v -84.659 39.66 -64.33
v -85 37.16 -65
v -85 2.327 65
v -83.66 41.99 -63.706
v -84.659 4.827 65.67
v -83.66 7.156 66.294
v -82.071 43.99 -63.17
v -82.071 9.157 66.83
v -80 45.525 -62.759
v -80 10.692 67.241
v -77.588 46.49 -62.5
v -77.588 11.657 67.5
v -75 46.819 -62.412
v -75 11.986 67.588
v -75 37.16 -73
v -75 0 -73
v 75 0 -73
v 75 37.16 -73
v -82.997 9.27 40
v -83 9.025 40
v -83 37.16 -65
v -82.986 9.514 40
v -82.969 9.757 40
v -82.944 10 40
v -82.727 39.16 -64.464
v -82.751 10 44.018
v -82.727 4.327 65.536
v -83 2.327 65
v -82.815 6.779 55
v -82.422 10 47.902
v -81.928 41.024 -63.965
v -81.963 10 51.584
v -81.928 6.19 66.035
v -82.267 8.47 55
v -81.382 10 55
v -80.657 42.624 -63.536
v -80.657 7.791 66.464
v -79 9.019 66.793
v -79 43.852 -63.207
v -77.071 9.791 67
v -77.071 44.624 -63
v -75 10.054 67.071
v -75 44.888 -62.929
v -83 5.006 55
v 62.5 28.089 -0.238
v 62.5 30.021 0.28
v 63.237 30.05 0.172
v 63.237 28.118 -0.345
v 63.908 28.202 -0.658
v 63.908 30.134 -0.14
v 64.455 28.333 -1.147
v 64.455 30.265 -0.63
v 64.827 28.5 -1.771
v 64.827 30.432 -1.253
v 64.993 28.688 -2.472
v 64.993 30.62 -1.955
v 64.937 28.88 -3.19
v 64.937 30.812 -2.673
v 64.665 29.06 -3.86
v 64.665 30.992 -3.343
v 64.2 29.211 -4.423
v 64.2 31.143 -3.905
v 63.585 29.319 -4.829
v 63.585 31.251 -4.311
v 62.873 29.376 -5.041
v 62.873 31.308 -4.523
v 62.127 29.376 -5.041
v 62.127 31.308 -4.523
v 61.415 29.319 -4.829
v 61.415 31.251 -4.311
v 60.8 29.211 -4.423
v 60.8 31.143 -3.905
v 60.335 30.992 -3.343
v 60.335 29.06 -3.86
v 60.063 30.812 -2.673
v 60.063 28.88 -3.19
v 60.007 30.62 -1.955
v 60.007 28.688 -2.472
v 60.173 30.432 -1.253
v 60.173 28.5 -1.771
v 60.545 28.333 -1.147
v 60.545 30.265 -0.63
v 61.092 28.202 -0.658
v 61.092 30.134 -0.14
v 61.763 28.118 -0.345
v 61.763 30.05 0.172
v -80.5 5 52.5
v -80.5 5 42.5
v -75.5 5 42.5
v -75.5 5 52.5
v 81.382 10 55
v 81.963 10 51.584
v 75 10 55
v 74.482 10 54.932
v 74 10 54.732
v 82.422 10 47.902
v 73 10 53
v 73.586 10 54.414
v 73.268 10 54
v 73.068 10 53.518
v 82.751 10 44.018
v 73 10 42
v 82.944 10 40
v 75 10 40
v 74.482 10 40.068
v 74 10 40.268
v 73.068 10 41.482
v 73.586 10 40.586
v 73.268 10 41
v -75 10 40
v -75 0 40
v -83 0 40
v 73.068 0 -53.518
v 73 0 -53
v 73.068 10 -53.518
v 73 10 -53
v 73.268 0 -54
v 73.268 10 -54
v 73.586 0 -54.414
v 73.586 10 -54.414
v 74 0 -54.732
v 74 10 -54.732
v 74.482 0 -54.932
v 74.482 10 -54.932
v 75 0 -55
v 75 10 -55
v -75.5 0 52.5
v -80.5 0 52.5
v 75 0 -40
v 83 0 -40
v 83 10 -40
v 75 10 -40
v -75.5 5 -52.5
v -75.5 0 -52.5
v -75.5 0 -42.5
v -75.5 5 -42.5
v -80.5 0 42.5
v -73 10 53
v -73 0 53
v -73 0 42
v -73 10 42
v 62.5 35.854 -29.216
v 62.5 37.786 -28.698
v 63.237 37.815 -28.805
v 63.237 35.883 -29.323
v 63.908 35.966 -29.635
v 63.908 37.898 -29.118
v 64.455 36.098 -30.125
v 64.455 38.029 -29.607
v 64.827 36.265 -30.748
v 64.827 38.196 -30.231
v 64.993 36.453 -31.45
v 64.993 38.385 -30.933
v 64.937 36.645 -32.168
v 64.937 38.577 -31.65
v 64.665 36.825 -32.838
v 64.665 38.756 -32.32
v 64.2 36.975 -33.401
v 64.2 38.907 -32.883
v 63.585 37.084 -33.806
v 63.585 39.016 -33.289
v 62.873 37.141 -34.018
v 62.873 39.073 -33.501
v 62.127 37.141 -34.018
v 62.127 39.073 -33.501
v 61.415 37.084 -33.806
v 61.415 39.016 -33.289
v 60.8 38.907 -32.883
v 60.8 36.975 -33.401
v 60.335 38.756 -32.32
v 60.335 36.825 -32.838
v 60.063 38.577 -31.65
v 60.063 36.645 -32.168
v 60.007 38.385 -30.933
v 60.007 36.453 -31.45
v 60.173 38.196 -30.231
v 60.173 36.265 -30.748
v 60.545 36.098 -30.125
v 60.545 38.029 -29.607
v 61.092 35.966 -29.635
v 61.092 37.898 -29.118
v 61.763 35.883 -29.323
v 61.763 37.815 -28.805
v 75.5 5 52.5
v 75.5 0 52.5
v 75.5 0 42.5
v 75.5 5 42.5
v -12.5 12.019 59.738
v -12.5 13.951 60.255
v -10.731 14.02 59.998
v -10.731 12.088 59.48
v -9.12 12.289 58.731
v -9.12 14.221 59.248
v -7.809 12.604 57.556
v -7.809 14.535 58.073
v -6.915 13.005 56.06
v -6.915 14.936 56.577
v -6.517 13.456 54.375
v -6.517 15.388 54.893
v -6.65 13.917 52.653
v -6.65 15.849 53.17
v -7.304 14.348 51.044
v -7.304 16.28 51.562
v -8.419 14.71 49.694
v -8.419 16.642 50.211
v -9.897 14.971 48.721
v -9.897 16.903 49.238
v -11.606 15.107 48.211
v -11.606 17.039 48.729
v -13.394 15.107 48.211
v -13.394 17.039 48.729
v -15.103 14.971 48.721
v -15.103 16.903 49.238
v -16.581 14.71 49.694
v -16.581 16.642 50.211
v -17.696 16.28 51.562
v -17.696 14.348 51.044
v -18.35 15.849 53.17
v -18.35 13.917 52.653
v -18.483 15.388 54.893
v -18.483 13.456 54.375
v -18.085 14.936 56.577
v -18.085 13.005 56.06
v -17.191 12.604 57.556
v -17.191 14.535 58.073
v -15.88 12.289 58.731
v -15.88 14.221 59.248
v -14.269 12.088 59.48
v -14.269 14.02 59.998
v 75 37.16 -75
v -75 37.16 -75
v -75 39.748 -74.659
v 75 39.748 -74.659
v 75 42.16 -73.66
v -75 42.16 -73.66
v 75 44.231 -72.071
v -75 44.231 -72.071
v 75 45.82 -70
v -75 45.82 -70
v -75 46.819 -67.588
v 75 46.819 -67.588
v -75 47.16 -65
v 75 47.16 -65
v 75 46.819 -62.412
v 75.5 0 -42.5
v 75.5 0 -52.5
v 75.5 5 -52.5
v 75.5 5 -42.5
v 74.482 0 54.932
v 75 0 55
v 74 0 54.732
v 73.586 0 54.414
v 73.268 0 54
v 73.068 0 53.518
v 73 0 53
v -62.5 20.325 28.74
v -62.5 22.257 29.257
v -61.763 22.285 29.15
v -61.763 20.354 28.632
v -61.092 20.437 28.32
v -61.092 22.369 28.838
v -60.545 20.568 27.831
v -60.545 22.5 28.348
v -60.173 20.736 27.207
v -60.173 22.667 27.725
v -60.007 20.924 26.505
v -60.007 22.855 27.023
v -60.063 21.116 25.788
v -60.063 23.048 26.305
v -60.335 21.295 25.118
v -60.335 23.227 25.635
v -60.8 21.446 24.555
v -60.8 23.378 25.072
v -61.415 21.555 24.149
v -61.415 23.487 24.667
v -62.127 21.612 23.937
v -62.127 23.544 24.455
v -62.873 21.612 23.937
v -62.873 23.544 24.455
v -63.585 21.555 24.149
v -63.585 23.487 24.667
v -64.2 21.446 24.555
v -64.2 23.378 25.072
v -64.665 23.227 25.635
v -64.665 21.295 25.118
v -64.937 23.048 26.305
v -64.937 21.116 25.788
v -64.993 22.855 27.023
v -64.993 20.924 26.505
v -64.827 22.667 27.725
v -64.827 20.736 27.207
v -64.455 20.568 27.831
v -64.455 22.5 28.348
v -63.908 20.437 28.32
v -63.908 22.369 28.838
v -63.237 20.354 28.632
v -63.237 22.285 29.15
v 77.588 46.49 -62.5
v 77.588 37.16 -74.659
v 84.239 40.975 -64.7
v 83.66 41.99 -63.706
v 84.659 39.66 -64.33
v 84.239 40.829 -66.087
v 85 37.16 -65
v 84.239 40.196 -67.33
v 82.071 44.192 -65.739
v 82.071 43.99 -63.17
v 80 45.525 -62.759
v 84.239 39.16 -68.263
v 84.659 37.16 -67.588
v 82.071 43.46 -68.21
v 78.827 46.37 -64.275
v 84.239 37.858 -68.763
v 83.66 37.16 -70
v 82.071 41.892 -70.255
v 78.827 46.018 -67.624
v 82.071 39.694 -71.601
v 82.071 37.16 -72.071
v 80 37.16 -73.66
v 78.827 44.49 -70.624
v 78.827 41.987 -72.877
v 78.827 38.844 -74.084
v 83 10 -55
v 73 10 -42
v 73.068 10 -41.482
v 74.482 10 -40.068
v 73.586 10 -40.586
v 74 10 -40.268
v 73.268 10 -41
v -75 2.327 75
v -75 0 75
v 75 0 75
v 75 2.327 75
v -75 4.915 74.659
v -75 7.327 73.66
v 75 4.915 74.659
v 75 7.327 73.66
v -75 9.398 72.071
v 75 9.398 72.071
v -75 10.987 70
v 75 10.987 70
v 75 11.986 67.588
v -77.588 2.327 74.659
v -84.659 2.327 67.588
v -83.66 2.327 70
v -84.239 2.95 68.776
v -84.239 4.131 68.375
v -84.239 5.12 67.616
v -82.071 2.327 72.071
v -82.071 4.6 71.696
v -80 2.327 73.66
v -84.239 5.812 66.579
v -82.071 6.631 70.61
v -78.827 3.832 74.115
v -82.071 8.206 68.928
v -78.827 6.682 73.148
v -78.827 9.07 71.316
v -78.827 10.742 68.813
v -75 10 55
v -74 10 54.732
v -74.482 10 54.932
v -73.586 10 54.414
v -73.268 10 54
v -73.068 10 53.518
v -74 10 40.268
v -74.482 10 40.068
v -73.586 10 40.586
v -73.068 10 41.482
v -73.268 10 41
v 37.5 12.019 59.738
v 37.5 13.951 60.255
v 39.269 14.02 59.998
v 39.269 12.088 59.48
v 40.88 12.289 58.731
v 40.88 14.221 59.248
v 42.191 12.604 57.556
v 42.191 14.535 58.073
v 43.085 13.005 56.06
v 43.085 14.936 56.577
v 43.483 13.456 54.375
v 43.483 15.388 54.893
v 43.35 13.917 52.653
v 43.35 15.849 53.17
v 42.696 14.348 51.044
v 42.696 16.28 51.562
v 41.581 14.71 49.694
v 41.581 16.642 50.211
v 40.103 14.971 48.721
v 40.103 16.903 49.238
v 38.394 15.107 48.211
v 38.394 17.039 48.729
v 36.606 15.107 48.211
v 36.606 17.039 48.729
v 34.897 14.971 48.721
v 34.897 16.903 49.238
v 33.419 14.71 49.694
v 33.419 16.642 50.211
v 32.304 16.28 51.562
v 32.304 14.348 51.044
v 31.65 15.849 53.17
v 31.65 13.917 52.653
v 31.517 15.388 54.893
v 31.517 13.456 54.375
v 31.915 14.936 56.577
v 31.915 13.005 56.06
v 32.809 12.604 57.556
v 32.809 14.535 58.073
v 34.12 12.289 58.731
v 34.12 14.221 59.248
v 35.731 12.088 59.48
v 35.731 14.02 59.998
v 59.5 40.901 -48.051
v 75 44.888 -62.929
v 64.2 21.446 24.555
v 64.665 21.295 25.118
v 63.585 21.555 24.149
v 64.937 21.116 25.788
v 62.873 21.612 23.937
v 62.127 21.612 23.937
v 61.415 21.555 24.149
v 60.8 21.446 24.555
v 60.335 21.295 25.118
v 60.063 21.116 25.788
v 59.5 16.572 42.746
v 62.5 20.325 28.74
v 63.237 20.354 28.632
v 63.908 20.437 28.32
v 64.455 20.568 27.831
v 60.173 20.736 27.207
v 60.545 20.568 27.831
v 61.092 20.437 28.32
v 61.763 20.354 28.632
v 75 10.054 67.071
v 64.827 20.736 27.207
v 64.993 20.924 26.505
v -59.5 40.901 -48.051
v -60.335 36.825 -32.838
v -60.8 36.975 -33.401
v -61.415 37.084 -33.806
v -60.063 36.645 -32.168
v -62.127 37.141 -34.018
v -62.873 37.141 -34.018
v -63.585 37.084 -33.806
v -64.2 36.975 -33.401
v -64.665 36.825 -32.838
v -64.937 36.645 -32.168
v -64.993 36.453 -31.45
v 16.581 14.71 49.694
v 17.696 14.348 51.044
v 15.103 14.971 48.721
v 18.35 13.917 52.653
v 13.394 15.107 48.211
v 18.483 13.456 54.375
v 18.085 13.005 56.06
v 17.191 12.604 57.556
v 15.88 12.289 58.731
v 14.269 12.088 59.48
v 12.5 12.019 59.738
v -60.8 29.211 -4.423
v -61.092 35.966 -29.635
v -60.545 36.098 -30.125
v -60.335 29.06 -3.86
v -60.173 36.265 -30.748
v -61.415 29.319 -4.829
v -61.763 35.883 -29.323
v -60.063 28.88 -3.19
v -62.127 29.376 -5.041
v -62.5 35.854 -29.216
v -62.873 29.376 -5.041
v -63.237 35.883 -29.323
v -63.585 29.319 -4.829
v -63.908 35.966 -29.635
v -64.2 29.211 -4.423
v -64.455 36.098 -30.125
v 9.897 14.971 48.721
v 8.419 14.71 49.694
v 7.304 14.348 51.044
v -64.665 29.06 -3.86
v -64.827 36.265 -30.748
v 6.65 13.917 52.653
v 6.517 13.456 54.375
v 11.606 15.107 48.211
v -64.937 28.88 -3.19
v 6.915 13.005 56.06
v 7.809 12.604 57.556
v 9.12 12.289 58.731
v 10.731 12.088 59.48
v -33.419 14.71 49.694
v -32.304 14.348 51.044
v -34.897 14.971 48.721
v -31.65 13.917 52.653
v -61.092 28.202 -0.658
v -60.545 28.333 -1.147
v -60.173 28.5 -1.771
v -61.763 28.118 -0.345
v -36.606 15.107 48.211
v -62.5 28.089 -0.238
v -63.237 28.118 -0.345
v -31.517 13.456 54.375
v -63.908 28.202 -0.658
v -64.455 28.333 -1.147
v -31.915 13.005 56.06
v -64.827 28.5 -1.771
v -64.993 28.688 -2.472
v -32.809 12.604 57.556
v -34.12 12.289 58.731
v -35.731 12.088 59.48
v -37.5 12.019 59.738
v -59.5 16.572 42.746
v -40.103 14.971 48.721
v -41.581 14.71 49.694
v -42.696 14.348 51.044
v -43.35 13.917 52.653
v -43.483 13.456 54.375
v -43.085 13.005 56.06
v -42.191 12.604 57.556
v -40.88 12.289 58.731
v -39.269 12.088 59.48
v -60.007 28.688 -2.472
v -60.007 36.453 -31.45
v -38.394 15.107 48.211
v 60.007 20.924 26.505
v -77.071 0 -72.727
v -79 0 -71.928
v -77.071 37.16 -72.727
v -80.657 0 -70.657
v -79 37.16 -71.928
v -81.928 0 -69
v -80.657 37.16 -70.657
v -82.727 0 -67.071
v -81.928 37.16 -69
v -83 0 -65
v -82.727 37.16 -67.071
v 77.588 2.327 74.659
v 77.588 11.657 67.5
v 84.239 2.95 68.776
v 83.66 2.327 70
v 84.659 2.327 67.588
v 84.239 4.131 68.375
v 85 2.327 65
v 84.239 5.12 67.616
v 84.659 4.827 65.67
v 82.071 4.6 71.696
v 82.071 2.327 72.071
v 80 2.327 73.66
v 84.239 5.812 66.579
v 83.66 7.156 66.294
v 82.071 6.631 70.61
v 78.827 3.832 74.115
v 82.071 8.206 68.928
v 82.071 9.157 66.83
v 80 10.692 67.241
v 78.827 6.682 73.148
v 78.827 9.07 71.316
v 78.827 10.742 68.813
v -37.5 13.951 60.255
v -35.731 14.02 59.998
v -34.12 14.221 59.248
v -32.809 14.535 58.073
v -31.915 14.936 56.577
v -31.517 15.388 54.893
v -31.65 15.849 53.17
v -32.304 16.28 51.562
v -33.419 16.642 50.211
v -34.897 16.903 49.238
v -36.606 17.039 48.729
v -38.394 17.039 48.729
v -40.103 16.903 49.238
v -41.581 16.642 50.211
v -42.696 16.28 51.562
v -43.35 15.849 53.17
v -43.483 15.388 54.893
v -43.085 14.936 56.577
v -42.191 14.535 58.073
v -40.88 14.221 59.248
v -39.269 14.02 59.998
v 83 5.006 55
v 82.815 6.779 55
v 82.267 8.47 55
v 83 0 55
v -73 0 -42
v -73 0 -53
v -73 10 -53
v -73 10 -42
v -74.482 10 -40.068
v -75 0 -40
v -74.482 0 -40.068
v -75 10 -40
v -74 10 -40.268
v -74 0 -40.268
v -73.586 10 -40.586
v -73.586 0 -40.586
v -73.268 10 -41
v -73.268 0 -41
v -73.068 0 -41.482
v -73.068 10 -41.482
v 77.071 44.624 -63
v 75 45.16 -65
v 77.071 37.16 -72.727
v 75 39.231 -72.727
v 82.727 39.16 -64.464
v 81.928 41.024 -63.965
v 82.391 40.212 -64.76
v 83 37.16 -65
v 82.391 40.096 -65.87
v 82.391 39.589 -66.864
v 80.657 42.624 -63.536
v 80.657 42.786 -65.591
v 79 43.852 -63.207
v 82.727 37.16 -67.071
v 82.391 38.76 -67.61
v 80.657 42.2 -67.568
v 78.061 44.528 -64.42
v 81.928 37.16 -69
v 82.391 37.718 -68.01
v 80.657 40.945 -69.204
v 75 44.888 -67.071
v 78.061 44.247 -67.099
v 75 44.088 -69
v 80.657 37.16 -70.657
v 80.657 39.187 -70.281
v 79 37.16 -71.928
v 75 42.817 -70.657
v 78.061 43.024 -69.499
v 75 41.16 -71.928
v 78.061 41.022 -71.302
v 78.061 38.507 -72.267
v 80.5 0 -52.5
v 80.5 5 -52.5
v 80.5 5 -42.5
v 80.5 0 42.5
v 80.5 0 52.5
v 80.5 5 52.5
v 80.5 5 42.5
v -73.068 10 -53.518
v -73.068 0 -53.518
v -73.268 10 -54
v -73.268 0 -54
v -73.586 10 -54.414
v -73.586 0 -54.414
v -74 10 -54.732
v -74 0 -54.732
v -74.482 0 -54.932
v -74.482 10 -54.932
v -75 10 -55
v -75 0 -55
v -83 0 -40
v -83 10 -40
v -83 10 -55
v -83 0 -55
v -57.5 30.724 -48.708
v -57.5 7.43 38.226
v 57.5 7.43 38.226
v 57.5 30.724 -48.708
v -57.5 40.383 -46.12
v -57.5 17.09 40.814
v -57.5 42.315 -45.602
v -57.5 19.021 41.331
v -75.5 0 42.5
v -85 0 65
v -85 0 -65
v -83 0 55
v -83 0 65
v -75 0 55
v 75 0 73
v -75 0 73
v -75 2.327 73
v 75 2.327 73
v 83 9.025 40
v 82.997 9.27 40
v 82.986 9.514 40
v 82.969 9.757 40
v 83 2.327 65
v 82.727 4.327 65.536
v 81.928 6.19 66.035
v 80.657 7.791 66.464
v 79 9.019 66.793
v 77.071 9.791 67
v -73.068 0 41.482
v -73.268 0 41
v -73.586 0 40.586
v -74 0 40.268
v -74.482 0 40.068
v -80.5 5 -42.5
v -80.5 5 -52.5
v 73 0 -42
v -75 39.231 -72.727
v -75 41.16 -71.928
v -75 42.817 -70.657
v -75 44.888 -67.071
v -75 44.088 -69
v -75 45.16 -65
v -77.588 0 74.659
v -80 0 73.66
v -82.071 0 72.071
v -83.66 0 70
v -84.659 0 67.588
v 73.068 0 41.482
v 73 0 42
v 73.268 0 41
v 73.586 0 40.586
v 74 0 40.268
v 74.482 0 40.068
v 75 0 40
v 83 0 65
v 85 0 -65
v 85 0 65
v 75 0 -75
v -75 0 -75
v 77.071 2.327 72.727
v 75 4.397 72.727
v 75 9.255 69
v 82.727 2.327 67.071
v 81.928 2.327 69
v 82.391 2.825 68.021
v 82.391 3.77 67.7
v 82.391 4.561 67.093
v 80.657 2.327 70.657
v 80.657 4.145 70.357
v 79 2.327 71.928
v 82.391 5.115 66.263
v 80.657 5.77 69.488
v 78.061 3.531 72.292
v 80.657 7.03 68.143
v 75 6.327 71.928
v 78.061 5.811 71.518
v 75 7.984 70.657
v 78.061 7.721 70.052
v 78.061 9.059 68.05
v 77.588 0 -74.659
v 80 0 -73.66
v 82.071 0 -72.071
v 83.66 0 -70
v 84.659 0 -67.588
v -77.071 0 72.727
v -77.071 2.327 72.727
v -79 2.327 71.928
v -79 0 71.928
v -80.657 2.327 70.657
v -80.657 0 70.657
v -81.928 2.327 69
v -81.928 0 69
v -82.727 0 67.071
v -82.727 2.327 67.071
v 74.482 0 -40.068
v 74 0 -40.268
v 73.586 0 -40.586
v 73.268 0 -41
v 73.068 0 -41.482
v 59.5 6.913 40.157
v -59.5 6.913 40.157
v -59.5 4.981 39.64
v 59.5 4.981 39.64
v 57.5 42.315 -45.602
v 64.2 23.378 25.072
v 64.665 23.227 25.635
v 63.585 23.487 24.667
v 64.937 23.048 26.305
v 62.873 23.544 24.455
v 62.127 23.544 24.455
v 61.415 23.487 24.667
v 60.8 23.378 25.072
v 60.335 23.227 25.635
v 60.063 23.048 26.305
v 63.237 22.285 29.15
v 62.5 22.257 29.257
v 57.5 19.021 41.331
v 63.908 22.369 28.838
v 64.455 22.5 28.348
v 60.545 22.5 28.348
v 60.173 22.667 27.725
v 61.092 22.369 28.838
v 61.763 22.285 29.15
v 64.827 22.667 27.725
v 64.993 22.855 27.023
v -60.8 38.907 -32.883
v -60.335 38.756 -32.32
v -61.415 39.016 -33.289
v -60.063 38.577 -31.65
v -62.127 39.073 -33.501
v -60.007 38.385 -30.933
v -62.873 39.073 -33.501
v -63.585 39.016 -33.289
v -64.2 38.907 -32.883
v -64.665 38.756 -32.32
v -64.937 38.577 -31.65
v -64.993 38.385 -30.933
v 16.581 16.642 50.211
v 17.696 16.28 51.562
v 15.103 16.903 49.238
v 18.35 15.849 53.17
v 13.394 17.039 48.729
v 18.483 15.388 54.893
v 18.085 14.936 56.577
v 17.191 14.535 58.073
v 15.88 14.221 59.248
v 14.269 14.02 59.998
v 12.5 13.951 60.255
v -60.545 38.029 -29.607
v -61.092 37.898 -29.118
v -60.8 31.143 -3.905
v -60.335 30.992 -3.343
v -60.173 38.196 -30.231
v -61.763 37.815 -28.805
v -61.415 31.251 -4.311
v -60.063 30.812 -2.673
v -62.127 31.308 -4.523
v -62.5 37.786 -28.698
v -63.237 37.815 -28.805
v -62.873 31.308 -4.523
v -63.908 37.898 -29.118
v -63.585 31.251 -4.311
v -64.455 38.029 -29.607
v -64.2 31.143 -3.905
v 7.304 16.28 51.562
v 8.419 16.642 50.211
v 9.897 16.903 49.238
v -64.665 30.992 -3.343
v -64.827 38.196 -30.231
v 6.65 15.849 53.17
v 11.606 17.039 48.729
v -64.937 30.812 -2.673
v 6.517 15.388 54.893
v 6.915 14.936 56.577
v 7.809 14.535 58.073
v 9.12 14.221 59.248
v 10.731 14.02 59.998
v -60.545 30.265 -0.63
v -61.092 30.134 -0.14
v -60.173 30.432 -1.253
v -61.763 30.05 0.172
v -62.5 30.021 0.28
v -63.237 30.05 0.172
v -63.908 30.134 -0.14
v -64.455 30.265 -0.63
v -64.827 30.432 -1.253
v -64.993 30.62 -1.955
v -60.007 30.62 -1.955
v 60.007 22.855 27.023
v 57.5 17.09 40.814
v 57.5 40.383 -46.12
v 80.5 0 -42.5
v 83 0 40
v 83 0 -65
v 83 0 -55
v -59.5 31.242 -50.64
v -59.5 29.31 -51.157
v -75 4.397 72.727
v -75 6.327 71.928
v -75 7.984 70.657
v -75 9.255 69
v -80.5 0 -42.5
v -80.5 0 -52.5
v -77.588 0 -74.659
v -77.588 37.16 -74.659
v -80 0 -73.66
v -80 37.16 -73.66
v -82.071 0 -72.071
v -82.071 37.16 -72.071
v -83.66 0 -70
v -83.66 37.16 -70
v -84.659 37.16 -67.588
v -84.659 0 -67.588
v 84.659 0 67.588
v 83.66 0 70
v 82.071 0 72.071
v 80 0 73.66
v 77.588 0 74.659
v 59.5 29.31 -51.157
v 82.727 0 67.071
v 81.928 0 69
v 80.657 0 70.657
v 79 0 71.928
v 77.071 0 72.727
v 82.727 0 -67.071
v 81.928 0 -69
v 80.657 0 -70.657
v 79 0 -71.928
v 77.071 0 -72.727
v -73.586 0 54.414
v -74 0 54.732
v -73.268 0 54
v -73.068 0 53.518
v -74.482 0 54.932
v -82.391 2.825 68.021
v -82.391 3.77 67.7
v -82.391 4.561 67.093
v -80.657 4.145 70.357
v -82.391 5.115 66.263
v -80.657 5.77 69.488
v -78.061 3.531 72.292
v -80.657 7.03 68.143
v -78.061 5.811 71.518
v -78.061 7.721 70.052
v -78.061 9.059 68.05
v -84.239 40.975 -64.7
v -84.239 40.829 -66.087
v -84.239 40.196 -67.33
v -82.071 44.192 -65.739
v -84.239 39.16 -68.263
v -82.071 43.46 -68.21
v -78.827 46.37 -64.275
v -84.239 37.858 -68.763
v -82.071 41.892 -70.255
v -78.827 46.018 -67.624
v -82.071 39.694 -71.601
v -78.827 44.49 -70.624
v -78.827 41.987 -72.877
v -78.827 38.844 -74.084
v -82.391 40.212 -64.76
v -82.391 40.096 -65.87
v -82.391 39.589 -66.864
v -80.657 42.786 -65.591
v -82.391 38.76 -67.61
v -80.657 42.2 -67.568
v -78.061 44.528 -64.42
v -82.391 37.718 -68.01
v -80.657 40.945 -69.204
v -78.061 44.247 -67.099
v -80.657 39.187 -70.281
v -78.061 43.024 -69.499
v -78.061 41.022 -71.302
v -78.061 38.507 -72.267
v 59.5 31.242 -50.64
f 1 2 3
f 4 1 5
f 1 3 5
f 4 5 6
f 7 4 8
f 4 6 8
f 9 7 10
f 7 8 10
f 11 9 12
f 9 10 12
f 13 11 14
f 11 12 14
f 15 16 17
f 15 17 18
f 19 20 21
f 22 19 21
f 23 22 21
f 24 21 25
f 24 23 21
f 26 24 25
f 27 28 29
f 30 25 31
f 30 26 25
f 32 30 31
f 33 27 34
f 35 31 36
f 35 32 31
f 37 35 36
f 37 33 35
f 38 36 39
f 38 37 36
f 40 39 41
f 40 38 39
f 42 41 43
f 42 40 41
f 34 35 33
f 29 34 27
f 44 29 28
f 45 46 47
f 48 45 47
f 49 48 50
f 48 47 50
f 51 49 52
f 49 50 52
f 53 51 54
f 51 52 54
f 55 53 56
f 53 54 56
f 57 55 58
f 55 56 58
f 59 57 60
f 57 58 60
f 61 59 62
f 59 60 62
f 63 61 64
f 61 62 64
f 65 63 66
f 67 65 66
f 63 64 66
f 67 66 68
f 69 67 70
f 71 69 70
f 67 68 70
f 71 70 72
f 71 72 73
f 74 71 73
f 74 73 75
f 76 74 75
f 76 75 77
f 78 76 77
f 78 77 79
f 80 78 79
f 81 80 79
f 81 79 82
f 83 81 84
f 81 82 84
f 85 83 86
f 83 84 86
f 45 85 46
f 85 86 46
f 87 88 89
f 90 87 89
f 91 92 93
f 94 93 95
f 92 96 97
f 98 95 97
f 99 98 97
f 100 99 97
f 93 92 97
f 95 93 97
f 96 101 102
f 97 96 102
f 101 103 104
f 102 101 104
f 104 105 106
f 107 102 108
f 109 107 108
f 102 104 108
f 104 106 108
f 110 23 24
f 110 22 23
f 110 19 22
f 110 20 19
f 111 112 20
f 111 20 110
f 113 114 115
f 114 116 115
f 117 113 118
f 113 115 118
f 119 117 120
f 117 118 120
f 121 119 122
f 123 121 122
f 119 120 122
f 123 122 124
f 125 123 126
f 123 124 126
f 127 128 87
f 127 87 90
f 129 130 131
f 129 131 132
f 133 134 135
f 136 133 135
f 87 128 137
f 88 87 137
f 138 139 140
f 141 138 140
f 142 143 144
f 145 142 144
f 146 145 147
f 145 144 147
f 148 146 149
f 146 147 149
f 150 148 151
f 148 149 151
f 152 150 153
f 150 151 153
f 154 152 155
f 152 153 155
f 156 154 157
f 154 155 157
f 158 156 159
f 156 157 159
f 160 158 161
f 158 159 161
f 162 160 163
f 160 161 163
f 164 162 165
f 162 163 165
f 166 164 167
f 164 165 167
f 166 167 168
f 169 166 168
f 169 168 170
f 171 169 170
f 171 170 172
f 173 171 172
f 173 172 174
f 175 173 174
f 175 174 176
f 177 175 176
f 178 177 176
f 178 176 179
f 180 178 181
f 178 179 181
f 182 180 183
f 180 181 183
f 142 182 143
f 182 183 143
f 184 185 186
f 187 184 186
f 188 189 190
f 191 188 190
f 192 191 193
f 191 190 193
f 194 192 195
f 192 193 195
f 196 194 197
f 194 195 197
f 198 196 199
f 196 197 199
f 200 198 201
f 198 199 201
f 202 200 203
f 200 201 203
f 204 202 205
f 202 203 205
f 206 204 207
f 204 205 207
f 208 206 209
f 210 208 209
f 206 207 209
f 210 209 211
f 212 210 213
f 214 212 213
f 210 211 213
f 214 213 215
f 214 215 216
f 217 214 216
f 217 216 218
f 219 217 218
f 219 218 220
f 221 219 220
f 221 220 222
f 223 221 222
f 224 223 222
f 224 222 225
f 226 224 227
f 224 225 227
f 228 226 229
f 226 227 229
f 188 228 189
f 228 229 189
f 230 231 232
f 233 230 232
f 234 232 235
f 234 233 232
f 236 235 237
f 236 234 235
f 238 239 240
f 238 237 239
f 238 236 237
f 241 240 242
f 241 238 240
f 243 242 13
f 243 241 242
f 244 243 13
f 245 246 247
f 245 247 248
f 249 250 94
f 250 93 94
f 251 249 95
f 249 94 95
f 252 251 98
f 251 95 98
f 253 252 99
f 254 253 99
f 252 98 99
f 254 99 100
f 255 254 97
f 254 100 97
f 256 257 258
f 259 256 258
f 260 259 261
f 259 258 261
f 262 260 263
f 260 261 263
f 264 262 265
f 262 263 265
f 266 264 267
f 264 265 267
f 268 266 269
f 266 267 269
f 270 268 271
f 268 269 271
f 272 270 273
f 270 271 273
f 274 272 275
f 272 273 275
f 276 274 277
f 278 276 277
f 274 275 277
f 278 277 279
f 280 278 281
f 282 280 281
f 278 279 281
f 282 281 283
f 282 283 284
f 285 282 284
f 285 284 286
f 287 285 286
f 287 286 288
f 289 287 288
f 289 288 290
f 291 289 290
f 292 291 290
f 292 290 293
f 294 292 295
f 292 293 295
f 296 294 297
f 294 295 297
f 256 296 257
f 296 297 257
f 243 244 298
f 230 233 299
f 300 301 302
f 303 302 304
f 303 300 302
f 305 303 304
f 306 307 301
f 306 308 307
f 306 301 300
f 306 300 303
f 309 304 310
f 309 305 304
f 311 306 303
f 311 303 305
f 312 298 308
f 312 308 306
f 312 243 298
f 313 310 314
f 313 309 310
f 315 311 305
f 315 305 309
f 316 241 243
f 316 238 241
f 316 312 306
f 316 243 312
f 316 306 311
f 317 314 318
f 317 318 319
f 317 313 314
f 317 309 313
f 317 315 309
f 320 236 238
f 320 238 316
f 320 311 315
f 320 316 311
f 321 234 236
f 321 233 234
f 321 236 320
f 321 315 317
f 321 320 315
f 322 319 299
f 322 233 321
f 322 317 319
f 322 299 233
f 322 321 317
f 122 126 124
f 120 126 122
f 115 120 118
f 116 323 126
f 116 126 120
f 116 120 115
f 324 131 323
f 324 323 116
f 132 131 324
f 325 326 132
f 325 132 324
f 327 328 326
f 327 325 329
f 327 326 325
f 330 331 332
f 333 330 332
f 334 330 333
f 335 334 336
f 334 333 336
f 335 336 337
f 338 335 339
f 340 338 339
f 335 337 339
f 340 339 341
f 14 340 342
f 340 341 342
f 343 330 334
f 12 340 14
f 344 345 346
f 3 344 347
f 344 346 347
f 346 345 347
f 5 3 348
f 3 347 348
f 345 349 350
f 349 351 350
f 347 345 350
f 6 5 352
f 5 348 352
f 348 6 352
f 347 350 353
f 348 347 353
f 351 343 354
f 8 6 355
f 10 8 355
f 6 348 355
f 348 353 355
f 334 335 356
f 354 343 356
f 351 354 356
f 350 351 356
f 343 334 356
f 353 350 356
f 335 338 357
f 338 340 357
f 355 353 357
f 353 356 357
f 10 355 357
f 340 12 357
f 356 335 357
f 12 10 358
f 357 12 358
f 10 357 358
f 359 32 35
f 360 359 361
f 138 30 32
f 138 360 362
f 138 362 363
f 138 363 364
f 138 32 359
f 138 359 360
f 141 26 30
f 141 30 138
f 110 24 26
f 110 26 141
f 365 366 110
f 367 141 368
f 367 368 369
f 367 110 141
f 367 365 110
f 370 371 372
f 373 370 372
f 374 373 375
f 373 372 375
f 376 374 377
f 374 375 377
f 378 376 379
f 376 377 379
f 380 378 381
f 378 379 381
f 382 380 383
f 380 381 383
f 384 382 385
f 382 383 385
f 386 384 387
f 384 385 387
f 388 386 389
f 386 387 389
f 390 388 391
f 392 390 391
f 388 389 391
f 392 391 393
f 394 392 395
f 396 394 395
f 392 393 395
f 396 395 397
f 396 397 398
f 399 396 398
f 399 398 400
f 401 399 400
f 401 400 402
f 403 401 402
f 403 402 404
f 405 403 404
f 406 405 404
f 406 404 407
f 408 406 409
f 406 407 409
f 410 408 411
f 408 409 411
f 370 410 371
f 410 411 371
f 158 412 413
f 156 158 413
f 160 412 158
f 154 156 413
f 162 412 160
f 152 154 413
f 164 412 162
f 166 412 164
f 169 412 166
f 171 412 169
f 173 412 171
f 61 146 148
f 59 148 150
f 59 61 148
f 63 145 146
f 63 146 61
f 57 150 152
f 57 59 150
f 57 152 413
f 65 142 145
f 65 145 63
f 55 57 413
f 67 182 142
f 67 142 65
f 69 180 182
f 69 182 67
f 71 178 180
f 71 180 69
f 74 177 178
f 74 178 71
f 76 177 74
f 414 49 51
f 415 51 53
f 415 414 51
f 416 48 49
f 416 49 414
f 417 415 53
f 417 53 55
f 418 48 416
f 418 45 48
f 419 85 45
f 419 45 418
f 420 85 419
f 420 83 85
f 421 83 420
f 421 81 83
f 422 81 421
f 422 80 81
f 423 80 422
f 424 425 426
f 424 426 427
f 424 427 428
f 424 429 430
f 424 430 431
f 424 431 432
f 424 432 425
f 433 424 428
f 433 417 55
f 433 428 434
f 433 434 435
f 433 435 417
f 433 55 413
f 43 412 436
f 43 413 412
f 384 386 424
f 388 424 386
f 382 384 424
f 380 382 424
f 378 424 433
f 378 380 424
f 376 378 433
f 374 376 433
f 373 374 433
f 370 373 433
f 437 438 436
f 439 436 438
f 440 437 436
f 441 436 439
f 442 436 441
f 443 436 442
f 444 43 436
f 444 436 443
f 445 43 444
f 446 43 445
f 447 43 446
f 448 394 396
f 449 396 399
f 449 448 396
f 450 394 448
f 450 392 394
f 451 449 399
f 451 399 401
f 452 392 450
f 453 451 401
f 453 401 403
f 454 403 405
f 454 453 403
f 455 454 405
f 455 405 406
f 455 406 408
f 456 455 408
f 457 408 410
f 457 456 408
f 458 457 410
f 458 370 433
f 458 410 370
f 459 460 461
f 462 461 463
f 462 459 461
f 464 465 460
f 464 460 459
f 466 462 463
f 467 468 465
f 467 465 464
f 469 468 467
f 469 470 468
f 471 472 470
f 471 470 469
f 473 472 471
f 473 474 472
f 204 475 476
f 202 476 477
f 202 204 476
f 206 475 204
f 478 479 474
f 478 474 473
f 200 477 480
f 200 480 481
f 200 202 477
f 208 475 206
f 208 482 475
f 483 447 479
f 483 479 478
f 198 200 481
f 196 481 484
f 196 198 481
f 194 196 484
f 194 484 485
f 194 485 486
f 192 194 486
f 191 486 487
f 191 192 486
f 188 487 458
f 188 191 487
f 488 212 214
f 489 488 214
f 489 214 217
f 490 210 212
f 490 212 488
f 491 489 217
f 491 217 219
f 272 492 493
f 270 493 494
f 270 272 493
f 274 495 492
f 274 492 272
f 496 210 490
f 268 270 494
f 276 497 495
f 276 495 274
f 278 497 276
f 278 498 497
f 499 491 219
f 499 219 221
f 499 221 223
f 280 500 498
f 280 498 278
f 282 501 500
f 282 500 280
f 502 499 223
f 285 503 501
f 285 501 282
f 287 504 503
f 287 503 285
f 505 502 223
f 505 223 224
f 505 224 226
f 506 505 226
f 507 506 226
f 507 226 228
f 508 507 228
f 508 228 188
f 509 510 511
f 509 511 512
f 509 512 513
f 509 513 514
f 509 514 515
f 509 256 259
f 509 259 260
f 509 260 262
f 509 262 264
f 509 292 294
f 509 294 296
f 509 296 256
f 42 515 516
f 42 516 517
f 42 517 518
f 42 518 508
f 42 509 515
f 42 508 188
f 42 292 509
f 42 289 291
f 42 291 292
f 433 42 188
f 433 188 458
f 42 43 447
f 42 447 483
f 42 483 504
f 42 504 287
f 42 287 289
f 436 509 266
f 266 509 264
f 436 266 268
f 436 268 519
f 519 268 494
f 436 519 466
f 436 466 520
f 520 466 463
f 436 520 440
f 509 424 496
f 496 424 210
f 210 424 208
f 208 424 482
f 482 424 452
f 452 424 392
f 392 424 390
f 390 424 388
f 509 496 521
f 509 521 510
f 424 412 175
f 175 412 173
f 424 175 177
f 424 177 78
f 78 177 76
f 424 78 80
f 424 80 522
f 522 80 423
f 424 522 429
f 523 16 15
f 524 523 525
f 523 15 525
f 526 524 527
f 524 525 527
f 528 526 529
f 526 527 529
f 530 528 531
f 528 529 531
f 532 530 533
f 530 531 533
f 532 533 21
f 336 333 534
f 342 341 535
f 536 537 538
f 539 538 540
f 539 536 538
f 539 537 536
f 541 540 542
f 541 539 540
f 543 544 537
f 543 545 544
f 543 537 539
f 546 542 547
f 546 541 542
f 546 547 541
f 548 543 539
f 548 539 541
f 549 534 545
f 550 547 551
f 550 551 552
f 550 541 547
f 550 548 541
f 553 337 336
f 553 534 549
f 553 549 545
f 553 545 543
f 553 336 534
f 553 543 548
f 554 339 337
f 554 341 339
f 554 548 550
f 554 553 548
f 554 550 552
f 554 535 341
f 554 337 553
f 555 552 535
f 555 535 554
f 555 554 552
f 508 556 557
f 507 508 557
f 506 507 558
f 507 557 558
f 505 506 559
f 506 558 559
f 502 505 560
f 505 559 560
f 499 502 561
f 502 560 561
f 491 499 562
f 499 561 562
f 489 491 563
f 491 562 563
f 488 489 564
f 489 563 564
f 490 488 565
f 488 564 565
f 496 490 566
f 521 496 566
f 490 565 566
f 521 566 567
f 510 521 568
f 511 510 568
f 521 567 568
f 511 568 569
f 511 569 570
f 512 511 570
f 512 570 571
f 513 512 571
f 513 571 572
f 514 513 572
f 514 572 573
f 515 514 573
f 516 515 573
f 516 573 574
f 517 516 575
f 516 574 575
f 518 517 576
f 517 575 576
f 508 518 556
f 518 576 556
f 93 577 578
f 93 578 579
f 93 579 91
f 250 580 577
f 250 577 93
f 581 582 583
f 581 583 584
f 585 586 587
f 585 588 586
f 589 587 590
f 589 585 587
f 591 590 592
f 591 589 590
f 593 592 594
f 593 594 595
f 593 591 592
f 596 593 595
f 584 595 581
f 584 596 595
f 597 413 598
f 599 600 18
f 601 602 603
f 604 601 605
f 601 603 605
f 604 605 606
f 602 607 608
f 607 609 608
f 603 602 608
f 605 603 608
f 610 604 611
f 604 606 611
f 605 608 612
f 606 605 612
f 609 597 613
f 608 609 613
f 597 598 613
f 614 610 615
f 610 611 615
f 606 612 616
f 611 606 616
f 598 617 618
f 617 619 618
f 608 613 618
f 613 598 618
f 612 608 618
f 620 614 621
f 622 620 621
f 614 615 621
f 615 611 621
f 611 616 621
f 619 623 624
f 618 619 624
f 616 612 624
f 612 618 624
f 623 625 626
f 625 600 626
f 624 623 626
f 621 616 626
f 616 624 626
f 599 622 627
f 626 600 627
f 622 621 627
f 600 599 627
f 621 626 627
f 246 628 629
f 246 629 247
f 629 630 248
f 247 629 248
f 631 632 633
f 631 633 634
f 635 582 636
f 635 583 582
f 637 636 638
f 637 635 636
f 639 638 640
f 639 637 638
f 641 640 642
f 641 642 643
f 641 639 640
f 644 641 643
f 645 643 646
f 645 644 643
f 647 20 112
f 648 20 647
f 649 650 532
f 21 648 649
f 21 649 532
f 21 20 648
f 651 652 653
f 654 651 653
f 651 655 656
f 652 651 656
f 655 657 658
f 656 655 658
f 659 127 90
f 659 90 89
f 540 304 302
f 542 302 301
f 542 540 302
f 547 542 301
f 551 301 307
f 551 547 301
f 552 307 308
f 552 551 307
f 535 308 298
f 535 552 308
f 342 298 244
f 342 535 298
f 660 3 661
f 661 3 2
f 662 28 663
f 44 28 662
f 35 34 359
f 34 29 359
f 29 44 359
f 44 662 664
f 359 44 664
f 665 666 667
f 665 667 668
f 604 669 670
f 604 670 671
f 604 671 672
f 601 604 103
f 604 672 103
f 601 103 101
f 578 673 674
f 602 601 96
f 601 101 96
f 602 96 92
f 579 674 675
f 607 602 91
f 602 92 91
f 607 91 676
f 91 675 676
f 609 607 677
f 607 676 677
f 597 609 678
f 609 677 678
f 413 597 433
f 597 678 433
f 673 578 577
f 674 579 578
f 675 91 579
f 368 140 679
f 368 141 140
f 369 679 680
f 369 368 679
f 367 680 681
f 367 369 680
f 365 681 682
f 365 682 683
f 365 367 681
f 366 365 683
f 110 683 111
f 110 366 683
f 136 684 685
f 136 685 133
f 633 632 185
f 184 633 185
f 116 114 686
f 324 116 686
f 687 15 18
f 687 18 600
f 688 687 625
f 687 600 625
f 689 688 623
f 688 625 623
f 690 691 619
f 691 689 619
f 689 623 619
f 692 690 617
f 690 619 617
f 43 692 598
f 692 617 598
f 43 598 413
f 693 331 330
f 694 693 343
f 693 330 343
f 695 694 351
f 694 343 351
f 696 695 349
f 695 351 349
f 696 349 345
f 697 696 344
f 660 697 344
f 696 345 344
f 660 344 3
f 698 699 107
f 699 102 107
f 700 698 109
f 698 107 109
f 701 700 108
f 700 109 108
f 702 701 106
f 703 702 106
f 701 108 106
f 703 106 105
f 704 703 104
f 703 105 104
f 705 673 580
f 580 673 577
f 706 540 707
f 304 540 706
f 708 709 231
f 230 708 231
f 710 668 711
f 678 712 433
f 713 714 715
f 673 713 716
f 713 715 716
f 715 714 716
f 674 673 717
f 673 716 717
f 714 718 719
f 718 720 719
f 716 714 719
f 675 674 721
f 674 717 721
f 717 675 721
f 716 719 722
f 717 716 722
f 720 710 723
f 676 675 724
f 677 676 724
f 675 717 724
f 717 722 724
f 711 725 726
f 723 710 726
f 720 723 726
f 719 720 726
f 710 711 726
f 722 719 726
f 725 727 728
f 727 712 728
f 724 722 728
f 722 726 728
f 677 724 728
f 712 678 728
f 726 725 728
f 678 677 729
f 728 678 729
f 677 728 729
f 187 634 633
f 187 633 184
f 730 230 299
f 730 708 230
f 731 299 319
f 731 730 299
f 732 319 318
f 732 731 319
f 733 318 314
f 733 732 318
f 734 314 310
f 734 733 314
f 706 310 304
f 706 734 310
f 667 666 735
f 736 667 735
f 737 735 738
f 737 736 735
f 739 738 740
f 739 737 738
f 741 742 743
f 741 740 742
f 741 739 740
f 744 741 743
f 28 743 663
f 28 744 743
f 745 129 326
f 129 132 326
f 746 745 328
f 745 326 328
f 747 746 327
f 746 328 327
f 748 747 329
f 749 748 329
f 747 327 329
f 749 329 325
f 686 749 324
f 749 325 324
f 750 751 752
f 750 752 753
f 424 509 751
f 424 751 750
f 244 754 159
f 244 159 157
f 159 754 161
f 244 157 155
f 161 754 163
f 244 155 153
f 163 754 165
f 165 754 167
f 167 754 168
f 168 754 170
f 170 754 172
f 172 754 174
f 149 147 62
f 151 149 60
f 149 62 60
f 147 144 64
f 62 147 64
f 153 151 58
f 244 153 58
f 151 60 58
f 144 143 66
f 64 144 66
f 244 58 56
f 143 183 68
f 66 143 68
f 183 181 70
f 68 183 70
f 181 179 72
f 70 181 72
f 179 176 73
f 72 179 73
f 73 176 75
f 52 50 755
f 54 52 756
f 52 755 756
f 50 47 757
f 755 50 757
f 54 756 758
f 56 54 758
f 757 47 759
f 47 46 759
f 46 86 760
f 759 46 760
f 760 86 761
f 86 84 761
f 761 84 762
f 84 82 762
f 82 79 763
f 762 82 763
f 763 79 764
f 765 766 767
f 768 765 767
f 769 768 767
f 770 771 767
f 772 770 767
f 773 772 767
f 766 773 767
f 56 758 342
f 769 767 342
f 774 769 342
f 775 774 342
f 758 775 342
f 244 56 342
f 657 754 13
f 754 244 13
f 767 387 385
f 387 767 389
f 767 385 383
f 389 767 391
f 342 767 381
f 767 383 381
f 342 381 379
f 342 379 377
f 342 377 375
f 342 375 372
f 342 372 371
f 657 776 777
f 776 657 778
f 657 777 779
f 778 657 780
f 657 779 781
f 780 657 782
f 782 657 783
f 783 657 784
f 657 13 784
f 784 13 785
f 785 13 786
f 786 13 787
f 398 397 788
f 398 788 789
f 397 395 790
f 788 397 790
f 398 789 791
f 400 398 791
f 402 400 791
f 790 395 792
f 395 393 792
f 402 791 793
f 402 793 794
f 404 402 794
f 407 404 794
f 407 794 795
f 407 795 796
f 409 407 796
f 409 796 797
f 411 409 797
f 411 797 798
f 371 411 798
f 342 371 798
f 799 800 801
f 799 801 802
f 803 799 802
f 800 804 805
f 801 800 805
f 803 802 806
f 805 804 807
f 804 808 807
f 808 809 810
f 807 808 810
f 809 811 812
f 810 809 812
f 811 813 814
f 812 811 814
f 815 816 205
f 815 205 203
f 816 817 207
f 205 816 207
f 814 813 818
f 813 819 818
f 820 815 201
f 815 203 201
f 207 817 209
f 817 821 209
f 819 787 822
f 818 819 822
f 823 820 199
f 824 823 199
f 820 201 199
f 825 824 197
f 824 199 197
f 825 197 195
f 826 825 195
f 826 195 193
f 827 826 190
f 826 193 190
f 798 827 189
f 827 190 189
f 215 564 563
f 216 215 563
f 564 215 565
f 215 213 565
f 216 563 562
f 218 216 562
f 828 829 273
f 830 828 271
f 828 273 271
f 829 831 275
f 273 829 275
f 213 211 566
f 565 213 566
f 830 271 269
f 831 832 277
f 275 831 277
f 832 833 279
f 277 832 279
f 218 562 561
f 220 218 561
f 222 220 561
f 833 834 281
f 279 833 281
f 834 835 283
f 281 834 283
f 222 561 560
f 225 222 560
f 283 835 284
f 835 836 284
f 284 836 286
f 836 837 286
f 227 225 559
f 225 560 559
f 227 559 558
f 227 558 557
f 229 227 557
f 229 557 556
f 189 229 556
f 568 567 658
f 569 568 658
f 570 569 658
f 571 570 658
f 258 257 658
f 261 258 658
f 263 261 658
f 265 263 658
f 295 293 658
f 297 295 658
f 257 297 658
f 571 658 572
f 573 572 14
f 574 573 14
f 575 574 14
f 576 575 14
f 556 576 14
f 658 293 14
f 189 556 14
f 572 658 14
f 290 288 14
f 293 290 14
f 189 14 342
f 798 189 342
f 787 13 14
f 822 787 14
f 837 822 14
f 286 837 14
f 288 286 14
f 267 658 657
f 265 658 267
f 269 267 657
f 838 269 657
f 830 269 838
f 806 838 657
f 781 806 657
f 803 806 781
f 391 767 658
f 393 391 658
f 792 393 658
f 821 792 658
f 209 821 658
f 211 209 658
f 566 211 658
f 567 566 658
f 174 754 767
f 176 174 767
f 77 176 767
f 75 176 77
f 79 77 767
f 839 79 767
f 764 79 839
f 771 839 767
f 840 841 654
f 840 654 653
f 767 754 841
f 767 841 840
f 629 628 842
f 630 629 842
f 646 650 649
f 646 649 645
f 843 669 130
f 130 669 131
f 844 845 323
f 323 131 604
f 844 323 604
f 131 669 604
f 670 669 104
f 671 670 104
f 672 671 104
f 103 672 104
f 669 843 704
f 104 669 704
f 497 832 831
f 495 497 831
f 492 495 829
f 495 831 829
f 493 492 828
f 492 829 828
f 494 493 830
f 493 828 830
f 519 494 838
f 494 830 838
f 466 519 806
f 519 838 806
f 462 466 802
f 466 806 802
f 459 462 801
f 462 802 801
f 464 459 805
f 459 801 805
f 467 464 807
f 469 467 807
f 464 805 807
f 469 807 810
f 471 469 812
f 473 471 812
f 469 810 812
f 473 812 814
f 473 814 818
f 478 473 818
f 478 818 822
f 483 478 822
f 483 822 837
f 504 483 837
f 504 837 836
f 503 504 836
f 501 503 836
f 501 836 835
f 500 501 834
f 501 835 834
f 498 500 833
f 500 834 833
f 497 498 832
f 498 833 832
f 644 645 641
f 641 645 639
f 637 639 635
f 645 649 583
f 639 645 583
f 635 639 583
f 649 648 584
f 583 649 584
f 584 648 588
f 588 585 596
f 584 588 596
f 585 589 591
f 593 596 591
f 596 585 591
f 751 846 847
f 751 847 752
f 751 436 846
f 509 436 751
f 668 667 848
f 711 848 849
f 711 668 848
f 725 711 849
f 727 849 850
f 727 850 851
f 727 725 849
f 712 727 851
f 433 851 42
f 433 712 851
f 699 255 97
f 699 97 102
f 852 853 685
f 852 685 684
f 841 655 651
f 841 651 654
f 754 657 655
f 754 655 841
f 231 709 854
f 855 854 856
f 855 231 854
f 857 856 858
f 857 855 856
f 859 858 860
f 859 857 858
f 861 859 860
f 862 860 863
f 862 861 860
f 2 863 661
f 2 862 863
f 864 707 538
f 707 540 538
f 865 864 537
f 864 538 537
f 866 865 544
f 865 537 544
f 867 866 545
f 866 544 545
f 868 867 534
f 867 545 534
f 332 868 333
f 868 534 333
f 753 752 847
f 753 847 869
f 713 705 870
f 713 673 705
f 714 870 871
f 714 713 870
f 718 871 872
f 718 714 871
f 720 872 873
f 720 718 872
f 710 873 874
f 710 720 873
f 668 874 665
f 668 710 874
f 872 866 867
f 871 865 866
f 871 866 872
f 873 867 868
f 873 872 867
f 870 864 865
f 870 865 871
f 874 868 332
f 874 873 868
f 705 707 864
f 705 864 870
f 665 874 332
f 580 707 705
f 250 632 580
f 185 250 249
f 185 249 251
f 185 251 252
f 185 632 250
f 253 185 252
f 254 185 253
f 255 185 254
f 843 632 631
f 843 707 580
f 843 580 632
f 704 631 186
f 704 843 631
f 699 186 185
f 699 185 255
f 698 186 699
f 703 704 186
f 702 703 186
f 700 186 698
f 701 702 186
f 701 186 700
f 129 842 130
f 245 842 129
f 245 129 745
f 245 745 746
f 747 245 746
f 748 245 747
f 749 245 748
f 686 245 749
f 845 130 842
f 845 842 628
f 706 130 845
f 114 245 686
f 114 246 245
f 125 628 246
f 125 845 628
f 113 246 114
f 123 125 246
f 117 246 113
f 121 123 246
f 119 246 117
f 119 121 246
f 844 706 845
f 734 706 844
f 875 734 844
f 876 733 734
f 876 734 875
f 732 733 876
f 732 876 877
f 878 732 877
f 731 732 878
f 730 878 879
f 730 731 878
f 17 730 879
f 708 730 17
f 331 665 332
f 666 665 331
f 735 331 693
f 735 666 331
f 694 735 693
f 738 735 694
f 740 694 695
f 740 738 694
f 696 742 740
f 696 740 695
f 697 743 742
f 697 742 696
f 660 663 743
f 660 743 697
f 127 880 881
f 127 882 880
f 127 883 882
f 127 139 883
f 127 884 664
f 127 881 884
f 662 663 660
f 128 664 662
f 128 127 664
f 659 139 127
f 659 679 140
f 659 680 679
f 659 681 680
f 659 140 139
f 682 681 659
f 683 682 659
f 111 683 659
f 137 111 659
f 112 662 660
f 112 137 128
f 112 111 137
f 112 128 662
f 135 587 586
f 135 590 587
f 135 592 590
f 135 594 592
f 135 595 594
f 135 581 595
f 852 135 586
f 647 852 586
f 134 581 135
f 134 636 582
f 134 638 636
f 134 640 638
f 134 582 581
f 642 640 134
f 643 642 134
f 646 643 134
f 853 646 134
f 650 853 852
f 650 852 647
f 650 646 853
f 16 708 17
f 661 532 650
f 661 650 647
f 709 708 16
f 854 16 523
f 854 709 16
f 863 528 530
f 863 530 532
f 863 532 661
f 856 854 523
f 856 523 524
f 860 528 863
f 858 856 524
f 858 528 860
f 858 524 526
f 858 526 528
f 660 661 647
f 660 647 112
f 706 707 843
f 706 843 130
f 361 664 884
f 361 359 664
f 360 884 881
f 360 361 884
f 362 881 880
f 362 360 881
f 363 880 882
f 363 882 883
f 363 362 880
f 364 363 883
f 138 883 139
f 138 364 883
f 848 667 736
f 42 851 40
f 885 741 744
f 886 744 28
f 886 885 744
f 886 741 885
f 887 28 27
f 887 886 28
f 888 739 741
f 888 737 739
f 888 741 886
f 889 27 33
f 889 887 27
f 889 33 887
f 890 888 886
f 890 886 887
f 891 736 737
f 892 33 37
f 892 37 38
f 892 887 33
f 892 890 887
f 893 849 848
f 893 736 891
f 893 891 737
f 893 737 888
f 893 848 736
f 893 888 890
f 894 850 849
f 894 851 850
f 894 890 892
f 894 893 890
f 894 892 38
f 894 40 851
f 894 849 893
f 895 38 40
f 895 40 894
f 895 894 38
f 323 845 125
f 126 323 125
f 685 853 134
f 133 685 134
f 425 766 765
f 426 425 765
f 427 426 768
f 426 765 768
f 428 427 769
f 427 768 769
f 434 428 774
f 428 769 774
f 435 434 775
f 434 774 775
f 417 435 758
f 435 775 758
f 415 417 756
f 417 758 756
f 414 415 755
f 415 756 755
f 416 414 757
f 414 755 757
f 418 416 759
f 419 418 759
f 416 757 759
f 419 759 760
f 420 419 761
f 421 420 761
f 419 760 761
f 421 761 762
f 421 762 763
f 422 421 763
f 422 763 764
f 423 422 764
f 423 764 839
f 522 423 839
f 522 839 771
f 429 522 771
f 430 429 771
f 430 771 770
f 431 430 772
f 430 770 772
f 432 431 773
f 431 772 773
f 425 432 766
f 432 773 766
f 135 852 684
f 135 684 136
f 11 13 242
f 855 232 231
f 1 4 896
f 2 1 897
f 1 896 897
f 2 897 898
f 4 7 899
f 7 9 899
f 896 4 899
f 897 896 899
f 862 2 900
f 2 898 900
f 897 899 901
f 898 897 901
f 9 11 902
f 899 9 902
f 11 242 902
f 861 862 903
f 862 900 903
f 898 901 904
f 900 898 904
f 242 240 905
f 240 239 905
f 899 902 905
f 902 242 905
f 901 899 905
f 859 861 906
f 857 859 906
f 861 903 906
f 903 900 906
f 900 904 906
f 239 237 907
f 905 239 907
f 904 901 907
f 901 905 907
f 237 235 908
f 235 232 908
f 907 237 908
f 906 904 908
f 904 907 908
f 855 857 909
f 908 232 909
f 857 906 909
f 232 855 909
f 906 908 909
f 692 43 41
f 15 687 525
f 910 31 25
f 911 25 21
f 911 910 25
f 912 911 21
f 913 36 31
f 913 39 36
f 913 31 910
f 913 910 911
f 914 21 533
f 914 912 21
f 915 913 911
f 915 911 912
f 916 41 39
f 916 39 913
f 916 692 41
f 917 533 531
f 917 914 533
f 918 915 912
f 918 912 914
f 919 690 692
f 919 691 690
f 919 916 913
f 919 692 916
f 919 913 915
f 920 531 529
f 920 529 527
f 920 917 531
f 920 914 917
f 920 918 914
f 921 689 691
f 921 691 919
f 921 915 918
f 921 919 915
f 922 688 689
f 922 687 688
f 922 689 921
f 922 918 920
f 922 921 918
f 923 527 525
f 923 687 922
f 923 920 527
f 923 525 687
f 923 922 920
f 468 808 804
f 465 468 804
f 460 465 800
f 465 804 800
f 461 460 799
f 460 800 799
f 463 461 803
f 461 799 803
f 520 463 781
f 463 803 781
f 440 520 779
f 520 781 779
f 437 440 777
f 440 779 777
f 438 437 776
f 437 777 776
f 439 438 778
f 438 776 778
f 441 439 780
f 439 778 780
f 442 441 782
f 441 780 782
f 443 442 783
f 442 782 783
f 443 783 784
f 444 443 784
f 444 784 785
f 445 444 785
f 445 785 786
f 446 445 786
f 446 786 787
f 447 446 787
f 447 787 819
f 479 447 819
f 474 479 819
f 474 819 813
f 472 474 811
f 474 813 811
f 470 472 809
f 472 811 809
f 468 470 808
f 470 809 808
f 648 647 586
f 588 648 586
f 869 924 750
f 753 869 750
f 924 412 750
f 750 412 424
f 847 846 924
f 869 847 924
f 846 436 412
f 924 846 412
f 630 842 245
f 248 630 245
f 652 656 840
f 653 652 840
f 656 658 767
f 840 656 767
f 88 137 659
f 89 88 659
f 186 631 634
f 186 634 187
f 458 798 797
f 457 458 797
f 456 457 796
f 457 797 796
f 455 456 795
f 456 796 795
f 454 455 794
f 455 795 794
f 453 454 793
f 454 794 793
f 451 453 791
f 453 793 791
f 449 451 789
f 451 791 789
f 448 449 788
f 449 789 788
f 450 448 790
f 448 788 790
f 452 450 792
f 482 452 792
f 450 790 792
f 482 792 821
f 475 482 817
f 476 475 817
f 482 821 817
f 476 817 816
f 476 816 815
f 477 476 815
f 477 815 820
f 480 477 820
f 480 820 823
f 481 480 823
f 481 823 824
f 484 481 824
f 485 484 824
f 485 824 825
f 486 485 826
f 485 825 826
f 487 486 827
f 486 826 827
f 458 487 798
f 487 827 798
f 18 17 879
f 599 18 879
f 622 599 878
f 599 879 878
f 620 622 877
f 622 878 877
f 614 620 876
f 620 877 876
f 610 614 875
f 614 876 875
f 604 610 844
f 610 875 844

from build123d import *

# Parameters (mm, degrees)
SKETCH1_W                                  = 170
SKETCH1_H                                  = 150
BOSS_EXTRUDE1_DEPTH                        = 10
BOSS_EXTRUDE2_DEPTH                        = 170
FILLET1_R                                  = 10
SHELL1_T                                   = -2
SKETCH3_W                                  = 115
SKETCH3_H                                  = 90
CUT_EXTRUDE1_DEPTH                         = 2
SKETCH4_W                                  = 119
SKETCH4_H                                  = 94
SKETCH4_W_2                                = 115
SKETCH4_H_2                                = 90
BOSS_EXTRUDE3_DEPTH                        = 10
SKETCH5_W                                  = 119
SKETCH5_H                                  = 94
BOSS_EXTRUDE4_DEPTH                        = 2
SKETCH6_R                                  = 2.5
CUT_EXTRUDE2_DEPTH                         = 2
SKETCH7_R                                  = 6
CUT_EXTRUDE3_DEPTH                         = 2
SKETCH9_W                                  = 10
SKETCH9_H                                  = 15
BOSS_EXTRUDE5_DEPTH                        = 10
SKETCH10_W                                 = 5
SKETCH10_H                                 = 10
CUT_EXTRUDE4_DEPTH                         = 5
MIRROR1_AT_THE_SECOND_PLANE_COPY_1_SKETC_W = 10
MIRROR1_AT_THE_SECOND_PLANE_COPY_1_SKETC_H = 15
MIRROR1_AT_THE_SECOND_PLANE_COPY_1_DEPTH   = 10
MIRROR1_AT_THE_SECOND_PLANE_COPY_2_SKETC_W = 5
MIRROR1_AT_THE_SECOND_PLANE_COPY_2_SKETC_H = 10
MIRROR1_AT_THE_SECOND_PLANE_COPY_2_DEPTH   = 5
FILLET2_R                                  = 2


with BuildPart() as part:
    # Sketch1 → Boss-Extrude1 (new body)
    with BuildSketch(Plane(origin=(0, 0, 0), x_dir=(1, 0, 0), z_dir=(0, 1, 0))):
        Rectangle(SKETCH1_W, SKETCH1_H)
    extrude(amount=BOSS_EXTRUDE1_DEPTH)

    # Sketch2 → Boss-Extrude2 (add)
    with BuildSketch(Plane.ZY.offset(85)):
        Polygon((-75, 10), (-75, 50.192378865), (75, 10), align=None)
    extrude(amount=-BOSS_EXTRUDE2_DEPTH)

    # Fillet1
    fillet1_edges = [part.edges().sort_by_distance(p)[0] for p in [
        (0, 50.192378865, -75),
        (-85, 30.096189432, 0),
        (85, 30.096189432, 0),
        (0, 10, 75),
        (85, 5, 75),
        (-85, 5, 75),
        (-85, 25.096189432, -75),
        (85, 25.096189432, -75),
    ]]
    fillet(fillet1_edges, radius=FILLET1_R)

    # Shell1
    shell1_openings = [part.faces().sort_by_distance(p)[0] for p in [
        (0, 0, 0),
    ]]
    offset(amount=SHELL1_T, openings=shell1_openings, kind=Kind.INTERSECTION)

    # Sketch3 → Cut-Extrude1 (cut)
    with BuildSketch(Plane(origin=(0, 28.080127019, 7.524047358), x_dir=(1, 0, 0), z_dir=(0, 0.96592582628907, 0.25881904510251436))):
        with Locations((0, 10)):
            Rectangle(SKETCH3_W, SKETCH3_H)
    extrude(amount=-CUT_EXTRUDE1_DEPTH, mode=Mode.SUBTRACT)

    # Sketch4 → Boss-Extrude3 (add)
    with BuildSketch(Plane(origin=(0, 26.148275366, 7.006409268), x_dir=(1, 0, 0), z_dir=(0, -0.96592582628907, -0.25881904510251436))):
        with Locations((0, -10)):
            Rectangle(SKETCH4_W, SKETCH4_H)
        with Locations((0, -10)):
            Rectangle(SKETCH4_W_2, SKETCH4_H_2, mode=Mode.SUBTRACT)
    extrude(amount=BOSS_EXTRUDE3_DEPTH)

    # Sketch5 → Boss-Extrude4 (add)
    with BuildSketch(Plane(origin=(0, 16.489017103, 4.418218817), x_dir=(1, 0, 0), z_dir=(0, -0.96592582628907, -0.25881904510251436))):
        with Locations((0, -10)):
            Rectangle(SKETCH5_W, SKETCH5_H)
    extrude(amount=BOSS_EXTRUDE4_DEPTH)

    # Sketch6 → Cut-Extrude2 (cut)
    with BuildSketch(Plane(origin=(0, 28.080127019, 7.524047358), x_dir=(1, 0, 0), z_dir=(0, 0.96592582628907, 0.25881904510251436))):
        with Locations(Location((-62.5, 10, 0), (0, 0, 270))):
            Circle(SKETCH6_R)
        with Locations(Location((-62.5, 40, 0), (0, 0, 270))):
            Circle(SKETCH6_R)
        with Locations(Location((-62.5, -20, 0), (0, 0, 270))):
            Circle(SKETCH6_R)
        with Locations(Location((62.5, -20, 0), (0, 0, 270))):
            Circle(SKETCH6_R)
        with Locations(Location((62.5, 40, 0), (0, 0, 270))):
            Circle(SKETCH6_R)
        with Locations(Location((62.5, 10, 0), (0, 0, 270))):
            Circle(SKETCH6_R)
    extrude(amount=-CUT_EXTRUDE2_DEPTH, mode=Mode.SUBTRACT)

    # Sketch7 → Cut-Extrude3 (cut)
    with BuildSketch(Plane(origin=(0, 28.080127019, 7.524047358), x_dir=(1, 0, 0), z_dir=(0, 0.96592582628907, 0.25881904510251436))):
        with Locations(Location((-12.5, -48.59148832, 0), (0, 0, 270))):
            Circle(SKETCH7_R)
        with Locations(Location((12.5, -48.59148832, 0), (0, 0, 270))):
            Circle(SKETCH7_R)
        with Locations(Location((37.5, -48.59148832, 0), (0, 0, 270))):
            Circle(SKETCH7_R)
        with Locations(Location((-37.5, -48.59148832, 0), (0, 0, 270))):
            Circle(SKETCH7_R)
    extrude(amount=-CUT_EXTRUDE3_DEPTH, mode=Mode.SUBTRACT)

    # Sketch9 → Boss-Extrude5 (add)
    with BuildSketch(Plane.XZ):
        with Locations((-78, -47.5)):
            Rectangle(SKETCH9_W, SKETCH9_H)
    boss_extrude5 = extrude(amount=-BOSS_EXTRUDE5_DEPTH)

    # Sketch10 → Cut-Extrude4 (cut)
    with BuildSketch(Plane.XZ):
        with Locations((-78, -47.5)):
            Rectangle(SKETCH10_W, SKETCH10_H)
    cut_extrude4 = extrude(amount=-CUT_EXTRUDE4_DEPTH, mode=Mode.SUBTRACT)

    # Mirror1: Boss-Extrude5, Cut-Extrude4 across plane
    add(boss_extrude5.mirror(Plane(origin=(0, 0, 0), x_dir=(0, 0, 1), z_dir=(1, 0, 0))))
    add(cut_extrude4.mirror(Plane(origin=(0, 0, 0), x_dir=(0, 0, 1), z_dir=(1, 0, 0))), mode=Mode.SUBTRACT)

    # Mirror1 at the second plane: Boss-Extrude5, Cut-Extrude4 across plane
    add(boss_extrude5.mirror(Plane.XY))
    add(cut_extrude4.mirror(Plane.XY), mode=Mode.SUBTRACT)

    # Mirror1 at the second plane copy 1 sketc → Mirror1 at the second plane copy 1 (add)
    with BuildSketch(Plane(origin=(0, 0, 0), x_dir=(-1, 0, 0), z_dir=(0, -1, 0))):
        with Locations((-78, -47.5)):
            Rectangle(MIRROR1_AT_THE_SECOND_PLANE_COPY_1_SKETC_W, MIRROR1_AT_THE_SECOND_PLANE_COPY_1_SKETC_H)
    extrude(amount=-MIRROR1_AT_THE_SECOND_PLANE_COPY_1_DEPTH)

    # Mirror1 at the second plane copy 2 sketc → Mirror1 at the second plane copy 2 (cut)
    with BuildSketch(Plane(origin=(0, 0, 0), x_dir=(-1, 0, 0), z_dir=(0, -1, 0))):
        with Locations((-78, -47.5)):
            Rectangle(MIRROR1_AT_THE_SECOND_PLANE_COPY_2_SKETC_W, MIRROR1_AT_THE_SECOND_PLANE_COPY_2_SKETC_H)
    extrude(amount=-MIRROR1_AT_THE_SECOND_PLANE_COPY_2_DEPTH, mode=Mode.SUBTRACT)

    # Fillet2
    fillet2_edges = [part.edges().sort_by_distance(p)[0] for p in [
        (-73, 5, -40),
        (-73, 5, -55),
        (-73, 5, 40),
        (-73, 5, 55),
        (73, 5, -55),
        (73, 5, -40),
        (73, 5, 55),
        (73, 5, 40),
    ]]
    fillet(fillet2_edges, radius=FILLET2_R)


solid = part.part
